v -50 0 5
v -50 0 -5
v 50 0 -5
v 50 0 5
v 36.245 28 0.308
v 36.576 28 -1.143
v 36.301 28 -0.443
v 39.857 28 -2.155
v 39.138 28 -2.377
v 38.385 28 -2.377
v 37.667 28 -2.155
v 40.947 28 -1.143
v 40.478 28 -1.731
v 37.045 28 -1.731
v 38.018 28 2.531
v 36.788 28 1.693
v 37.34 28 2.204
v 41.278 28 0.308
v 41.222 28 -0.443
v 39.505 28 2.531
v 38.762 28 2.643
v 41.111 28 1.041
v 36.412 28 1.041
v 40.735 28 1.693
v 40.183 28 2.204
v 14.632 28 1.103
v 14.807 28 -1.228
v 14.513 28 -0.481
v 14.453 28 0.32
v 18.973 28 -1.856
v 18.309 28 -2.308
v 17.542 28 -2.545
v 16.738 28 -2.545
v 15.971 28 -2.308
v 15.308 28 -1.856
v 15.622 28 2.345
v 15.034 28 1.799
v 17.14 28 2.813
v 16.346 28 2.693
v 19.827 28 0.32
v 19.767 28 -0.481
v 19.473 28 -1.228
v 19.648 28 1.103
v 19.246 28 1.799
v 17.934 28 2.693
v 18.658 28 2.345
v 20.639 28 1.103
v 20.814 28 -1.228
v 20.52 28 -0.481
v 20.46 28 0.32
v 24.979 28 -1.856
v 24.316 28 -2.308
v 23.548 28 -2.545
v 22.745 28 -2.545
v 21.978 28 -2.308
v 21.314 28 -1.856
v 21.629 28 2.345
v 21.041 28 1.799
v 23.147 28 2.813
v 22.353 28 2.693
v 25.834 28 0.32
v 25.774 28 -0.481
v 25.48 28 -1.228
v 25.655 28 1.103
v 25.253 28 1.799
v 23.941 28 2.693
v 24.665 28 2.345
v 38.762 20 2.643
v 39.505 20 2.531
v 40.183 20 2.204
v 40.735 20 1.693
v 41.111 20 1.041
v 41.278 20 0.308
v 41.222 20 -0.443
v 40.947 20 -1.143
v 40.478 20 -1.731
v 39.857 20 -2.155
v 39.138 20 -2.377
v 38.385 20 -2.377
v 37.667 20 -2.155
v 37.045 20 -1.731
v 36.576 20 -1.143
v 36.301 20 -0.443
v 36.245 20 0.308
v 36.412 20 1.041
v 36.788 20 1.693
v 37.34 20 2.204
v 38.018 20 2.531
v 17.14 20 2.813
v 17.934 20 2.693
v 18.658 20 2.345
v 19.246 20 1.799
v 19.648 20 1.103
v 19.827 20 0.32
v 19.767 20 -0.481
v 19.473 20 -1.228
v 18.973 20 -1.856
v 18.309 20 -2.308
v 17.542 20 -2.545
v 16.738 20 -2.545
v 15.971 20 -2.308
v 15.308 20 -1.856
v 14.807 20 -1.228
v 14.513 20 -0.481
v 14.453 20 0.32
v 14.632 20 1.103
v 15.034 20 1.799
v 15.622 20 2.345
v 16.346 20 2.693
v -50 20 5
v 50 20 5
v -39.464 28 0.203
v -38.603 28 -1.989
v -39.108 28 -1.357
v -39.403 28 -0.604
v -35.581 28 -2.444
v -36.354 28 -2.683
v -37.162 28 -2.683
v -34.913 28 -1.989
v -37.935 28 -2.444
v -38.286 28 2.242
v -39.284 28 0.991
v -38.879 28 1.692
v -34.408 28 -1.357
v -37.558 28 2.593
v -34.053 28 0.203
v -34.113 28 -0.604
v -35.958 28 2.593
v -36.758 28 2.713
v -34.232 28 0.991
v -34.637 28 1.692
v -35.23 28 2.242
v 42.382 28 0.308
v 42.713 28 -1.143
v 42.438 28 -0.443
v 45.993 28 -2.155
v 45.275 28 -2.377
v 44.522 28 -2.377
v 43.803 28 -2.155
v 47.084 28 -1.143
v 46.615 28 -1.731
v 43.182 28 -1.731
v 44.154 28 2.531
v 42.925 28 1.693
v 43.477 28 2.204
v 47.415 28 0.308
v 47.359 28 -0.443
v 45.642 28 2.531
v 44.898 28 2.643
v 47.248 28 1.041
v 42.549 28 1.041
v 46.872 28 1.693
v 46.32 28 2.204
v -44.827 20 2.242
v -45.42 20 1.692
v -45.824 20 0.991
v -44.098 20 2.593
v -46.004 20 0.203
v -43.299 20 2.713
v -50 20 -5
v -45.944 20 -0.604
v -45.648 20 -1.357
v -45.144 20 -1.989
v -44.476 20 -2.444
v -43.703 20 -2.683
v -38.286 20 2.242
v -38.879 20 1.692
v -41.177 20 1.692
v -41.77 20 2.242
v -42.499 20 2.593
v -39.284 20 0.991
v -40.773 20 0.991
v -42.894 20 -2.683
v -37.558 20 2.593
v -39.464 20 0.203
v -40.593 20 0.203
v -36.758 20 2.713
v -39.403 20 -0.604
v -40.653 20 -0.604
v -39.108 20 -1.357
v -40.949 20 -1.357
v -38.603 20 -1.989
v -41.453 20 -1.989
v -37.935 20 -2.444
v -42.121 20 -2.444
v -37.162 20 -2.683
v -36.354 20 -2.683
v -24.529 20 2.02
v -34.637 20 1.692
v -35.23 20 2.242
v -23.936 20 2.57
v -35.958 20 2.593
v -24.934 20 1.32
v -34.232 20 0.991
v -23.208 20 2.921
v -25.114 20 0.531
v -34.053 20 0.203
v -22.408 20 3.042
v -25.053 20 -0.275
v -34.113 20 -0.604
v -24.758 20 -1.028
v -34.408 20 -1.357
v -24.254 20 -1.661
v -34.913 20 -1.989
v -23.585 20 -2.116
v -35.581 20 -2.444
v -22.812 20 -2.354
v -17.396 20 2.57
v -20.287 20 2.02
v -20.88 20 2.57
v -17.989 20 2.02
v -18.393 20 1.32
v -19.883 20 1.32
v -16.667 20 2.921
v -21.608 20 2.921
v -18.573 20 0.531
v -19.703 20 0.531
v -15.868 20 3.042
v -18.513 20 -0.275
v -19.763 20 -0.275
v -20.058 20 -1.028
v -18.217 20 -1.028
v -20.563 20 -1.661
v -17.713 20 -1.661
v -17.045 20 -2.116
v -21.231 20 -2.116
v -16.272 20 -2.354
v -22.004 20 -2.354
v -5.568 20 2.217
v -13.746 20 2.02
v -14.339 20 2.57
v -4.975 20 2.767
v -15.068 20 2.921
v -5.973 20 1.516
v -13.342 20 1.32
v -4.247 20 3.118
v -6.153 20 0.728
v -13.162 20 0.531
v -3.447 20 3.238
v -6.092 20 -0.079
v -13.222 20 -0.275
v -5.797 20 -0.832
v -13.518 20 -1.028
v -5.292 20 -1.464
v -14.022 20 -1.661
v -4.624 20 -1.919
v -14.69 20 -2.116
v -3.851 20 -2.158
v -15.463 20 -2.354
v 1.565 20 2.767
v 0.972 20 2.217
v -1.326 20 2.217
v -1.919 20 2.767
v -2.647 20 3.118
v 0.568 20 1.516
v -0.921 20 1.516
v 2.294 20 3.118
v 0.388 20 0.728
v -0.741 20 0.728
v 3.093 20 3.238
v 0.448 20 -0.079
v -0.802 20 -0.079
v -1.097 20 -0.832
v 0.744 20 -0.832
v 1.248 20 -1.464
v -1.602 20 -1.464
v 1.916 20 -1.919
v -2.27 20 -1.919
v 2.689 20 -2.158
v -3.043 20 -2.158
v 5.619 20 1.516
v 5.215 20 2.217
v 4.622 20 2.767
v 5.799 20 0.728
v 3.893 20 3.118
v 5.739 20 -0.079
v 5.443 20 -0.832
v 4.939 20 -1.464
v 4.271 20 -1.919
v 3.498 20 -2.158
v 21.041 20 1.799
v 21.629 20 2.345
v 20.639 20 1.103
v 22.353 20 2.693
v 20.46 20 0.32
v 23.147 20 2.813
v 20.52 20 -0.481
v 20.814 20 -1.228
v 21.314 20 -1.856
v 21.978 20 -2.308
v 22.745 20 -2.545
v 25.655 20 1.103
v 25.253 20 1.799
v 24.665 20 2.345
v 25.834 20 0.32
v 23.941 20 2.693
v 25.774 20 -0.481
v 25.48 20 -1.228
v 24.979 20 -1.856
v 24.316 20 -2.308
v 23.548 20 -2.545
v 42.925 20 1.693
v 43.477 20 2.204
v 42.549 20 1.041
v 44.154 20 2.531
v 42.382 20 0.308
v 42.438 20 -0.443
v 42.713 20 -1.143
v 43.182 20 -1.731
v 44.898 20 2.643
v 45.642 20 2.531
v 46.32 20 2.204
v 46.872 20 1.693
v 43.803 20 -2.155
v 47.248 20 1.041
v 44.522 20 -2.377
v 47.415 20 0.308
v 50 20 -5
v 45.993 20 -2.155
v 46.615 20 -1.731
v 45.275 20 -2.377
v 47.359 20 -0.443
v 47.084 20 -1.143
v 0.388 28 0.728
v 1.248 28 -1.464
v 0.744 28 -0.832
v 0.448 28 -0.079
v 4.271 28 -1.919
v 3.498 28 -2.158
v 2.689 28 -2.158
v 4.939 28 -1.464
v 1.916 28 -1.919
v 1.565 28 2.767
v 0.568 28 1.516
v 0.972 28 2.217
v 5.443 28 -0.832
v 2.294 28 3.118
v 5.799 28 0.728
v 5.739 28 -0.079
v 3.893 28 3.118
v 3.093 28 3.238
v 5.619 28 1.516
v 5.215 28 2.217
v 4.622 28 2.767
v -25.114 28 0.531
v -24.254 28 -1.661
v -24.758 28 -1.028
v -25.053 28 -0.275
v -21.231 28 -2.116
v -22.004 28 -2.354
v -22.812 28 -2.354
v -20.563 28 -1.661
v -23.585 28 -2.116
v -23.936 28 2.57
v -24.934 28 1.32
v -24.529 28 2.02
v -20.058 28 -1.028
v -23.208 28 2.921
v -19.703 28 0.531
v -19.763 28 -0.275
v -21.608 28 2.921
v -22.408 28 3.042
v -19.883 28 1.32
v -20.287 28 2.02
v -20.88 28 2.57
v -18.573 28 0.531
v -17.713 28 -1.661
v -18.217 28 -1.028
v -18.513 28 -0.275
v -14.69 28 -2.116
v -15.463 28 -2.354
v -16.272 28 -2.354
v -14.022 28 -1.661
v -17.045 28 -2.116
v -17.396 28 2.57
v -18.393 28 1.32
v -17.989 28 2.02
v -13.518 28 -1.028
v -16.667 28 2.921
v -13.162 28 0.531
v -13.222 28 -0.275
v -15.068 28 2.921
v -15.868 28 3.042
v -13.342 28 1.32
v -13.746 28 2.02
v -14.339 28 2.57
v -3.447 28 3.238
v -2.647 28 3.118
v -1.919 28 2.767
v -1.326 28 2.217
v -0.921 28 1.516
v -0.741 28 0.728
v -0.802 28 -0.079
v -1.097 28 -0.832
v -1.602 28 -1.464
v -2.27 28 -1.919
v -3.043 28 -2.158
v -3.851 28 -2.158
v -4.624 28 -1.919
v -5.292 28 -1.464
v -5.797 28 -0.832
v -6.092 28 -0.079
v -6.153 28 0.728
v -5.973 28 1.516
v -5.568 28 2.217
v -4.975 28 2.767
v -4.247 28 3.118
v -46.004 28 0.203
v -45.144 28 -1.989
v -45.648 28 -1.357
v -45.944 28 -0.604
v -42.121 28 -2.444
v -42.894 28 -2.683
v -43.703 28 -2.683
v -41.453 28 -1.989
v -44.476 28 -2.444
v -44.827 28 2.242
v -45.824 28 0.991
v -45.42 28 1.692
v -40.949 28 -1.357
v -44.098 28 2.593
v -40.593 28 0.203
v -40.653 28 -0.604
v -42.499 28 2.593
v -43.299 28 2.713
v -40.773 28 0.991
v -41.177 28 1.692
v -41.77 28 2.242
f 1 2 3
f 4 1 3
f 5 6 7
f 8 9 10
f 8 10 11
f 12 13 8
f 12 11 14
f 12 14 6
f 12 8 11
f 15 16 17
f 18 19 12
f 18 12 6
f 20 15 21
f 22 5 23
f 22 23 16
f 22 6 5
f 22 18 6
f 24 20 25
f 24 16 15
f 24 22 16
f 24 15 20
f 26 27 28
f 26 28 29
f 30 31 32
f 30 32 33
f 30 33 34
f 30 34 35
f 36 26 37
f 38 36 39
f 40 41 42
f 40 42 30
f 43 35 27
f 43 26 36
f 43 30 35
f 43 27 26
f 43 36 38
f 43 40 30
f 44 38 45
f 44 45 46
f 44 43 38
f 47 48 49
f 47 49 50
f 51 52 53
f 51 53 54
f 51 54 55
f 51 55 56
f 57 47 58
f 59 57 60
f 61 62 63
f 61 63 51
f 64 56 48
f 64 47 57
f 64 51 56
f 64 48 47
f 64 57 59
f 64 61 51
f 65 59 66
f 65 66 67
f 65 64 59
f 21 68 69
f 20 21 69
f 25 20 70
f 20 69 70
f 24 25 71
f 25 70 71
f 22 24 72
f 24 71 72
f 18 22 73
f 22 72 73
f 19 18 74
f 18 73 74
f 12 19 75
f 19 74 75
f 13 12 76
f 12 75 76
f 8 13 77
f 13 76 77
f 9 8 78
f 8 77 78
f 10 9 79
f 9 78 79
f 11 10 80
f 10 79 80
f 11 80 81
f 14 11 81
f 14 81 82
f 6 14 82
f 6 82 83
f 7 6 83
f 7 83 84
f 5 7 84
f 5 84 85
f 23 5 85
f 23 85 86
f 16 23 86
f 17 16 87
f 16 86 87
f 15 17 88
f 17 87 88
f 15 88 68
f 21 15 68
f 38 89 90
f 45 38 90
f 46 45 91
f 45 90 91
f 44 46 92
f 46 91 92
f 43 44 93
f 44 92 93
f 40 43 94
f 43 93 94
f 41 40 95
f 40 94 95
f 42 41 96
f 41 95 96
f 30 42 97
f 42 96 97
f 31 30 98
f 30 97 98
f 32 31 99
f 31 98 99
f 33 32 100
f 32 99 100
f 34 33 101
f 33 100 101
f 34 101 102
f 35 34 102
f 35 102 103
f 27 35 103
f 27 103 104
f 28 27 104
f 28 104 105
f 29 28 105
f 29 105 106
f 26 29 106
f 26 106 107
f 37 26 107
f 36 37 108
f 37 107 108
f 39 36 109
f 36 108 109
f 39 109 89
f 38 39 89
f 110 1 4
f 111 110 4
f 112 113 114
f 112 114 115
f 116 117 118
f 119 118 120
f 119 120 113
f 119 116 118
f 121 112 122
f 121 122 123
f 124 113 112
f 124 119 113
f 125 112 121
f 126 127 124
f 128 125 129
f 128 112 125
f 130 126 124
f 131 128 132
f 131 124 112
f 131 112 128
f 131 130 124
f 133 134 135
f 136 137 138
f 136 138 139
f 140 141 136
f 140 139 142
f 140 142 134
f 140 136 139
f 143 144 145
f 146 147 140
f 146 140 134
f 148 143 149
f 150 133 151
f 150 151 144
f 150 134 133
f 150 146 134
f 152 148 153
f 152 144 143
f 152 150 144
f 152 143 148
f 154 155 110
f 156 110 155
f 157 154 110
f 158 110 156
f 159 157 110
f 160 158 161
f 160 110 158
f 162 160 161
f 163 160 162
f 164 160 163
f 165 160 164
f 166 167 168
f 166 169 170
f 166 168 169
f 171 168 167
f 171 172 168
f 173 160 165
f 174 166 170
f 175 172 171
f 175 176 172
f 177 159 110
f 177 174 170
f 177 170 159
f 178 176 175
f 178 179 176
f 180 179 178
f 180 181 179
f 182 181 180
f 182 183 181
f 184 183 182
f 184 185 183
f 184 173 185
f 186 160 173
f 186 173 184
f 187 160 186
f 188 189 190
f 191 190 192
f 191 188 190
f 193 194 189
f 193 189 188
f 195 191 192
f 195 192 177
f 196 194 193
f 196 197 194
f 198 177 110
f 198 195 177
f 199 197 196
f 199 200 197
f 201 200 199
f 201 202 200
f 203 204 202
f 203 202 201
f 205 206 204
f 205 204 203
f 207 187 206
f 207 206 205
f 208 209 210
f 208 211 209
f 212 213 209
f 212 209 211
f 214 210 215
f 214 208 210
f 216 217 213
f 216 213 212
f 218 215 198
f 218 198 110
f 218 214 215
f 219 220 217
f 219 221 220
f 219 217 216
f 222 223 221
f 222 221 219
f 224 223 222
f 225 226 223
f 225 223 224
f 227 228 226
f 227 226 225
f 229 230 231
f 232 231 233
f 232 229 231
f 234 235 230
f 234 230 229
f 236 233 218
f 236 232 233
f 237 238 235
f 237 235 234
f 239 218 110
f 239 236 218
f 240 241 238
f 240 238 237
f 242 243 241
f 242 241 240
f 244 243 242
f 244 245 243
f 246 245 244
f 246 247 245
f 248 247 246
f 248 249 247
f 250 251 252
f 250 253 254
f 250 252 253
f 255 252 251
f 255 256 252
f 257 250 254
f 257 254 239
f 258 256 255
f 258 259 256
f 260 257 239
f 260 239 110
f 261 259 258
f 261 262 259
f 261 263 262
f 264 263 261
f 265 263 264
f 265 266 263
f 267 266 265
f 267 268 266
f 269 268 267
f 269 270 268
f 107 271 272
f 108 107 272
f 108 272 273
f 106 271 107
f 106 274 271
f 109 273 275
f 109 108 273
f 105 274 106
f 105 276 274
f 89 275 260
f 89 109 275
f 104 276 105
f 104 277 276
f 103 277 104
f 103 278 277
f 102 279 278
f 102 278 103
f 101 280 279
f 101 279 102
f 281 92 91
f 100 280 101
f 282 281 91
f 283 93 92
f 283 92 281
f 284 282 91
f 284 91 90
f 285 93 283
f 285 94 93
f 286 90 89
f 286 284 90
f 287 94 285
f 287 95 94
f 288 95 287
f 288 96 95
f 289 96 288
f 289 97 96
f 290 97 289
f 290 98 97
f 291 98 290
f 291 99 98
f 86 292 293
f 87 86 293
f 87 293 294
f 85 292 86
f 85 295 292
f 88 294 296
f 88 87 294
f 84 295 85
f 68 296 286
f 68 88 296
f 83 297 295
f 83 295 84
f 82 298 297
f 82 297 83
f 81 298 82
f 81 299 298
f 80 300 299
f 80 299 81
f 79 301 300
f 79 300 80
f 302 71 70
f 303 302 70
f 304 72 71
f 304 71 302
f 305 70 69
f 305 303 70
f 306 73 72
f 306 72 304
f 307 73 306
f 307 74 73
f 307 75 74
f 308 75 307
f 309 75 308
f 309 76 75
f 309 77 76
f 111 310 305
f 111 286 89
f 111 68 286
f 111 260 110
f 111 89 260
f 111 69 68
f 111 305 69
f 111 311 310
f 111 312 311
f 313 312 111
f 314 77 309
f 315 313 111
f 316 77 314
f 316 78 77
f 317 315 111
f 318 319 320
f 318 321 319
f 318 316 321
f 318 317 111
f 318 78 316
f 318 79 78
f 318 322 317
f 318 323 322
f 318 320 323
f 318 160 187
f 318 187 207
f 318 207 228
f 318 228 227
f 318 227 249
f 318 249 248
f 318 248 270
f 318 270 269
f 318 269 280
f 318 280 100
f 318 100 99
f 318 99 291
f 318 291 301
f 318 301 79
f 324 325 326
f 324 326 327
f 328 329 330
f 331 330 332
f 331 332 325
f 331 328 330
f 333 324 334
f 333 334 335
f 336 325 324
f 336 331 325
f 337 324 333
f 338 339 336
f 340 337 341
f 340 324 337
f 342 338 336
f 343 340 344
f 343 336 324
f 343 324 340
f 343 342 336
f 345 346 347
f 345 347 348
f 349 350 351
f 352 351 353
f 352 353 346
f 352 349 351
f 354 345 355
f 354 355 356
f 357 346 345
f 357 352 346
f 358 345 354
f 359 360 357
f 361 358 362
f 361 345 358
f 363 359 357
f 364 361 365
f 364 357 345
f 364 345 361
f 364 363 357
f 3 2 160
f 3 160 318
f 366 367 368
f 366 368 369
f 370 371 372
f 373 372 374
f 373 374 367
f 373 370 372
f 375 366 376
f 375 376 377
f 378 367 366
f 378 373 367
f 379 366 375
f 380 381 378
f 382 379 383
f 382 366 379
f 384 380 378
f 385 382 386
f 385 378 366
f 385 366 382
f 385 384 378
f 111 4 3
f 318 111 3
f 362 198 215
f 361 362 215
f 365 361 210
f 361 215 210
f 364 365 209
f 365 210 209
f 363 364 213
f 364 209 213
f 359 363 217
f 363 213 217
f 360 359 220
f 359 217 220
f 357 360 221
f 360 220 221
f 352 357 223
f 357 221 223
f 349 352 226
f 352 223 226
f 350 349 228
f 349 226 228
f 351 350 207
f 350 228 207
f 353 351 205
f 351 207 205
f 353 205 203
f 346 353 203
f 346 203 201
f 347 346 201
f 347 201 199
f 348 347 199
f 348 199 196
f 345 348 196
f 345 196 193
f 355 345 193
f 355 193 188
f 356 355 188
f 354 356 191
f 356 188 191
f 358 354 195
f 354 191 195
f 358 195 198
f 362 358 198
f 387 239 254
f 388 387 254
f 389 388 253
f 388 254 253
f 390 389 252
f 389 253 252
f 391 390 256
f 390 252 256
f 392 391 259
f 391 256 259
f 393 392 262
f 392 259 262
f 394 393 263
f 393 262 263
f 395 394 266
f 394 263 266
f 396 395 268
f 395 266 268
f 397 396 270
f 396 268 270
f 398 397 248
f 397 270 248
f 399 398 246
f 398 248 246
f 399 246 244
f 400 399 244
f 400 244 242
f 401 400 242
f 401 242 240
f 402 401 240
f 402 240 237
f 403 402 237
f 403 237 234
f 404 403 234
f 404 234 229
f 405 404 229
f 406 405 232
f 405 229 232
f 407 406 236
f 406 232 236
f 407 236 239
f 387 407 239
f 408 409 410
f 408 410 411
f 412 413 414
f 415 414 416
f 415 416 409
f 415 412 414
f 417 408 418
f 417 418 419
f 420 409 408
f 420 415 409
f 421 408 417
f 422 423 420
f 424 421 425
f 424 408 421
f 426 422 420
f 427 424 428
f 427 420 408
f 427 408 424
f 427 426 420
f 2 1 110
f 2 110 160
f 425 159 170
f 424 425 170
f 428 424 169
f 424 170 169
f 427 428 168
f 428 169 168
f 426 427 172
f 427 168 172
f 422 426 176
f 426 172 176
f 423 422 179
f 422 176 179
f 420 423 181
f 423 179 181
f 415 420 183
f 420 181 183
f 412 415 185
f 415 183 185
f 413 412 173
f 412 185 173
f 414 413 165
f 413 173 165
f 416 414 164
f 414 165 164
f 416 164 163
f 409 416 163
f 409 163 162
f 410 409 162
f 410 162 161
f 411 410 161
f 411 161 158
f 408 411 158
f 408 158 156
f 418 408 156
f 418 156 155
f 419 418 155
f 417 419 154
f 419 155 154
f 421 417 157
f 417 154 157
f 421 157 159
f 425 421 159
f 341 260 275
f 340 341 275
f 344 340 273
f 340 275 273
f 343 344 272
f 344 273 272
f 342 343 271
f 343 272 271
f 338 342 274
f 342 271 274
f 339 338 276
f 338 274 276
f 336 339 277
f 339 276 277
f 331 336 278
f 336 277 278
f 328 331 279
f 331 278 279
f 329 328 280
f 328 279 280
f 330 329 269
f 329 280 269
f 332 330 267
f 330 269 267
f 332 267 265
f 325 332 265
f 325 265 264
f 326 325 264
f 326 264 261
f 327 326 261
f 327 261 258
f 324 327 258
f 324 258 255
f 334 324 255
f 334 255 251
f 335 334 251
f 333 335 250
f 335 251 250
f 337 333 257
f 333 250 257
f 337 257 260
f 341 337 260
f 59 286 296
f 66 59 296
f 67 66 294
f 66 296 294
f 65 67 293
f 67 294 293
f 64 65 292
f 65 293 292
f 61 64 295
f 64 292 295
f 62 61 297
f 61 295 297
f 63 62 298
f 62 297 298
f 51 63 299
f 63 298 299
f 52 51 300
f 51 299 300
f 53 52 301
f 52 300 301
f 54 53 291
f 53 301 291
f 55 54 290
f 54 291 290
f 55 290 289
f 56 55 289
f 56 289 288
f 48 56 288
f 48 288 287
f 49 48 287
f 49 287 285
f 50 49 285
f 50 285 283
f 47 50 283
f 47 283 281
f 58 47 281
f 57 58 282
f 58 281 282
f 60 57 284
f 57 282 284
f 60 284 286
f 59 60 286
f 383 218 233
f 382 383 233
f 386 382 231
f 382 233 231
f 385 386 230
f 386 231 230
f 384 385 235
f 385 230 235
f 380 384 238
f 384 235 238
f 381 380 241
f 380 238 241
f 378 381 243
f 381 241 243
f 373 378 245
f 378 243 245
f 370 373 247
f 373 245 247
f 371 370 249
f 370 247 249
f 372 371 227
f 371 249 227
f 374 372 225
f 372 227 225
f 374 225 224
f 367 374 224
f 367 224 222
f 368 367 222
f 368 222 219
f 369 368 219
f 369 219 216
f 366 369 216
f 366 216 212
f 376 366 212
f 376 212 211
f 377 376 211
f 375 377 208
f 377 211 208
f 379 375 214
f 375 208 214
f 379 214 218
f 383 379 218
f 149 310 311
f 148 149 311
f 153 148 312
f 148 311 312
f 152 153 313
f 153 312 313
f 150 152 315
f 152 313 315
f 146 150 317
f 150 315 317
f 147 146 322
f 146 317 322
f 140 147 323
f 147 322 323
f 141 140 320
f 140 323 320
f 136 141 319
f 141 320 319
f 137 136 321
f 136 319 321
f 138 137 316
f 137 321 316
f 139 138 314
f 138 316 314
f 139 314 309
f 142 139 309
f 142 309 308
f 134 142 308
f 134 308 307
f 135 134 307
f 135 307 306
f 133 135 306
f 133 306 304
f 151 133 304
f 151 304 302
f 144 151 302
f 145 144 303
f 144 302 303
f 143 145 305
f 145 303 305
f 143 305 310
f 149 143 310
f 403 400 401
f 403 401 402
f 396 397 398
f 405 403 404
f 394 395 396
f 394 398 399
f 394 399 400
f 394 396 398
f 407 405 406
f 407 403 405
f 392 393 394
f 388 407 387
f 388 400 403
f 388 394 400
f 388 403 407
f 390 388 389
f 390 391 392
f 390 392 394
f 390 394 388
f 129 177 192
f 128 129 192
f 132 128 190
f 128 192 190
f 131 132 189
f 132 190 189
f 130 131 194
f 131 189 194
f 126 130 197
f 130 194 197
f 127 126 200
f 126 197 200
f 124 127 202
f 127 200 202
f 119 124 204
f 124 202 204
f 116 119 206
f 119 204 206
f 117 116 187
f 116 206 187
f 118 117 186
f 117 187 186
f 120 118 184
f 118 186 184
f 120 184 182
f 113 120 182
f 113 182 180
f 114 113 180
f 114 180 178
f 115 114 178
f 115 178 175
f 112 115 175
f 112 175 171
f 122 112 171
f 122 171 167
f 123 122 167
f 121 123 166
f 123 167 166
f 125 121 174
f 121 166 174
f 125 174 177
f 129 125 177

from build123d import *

# Parameters (mm, degrees)
SKETCH1_W           = 100
SKETCH1_H           = 10
BOSS_EXTRUDE1_DEPTH = 20
SKETCH2_R           = 2.713153407
SKETCH2_R_2         = 2.694189889
SKETCH2_R_3         = 2.523769014
BOSS_EXTRUDE2_DEPTH = 8


with BuildPart() as part:
    # Sketch1 → Boss-Extrude1 (new body)
    with BuildSketch(Plane(origin=(0, 0, 0), x_dir=(1, 0, 0), z_dir=(0, 1, 0))):
        Rectangle(SKETCH1_W, SKETCH1_H)
    extrude(amount=BOSS_EXTRUDE1_DEPTH)

    # Sketch2 → Boss-Extrude2 (add)
    with BuildSketch(Plane(origin=(0, 20, 0), x_dir=(1, 0, 0), z_dir=(0, 1, 0))):
        with Locations(Location((-43.29861016, 0, 0), (0, 0, 270))):
            Circle(SKETCH2_R)
        with Locations(Location((-36.758074643, 0, 0), (0, 0, 270))):
            Circle(SKETCH2_R)
        with Locations(Location((-22.408108815, -0.328361024, 0), (0, 0, 270))):
            Circle(SKETCH2_R)
        with Locations(Location((-15.867573299, -0.328361024, 0), (0, 0, 270))):
            Circle(SKETCH2_R)
        with Locations(Location((17.140046294, -0.119001471, 0), (0, 0, 270))):
            Circle(SKETCH2_R_2)
        with Locations(Location((23.146948699, -0.119001471, 0), (0, 0, 270))):
            Circle(SKETCH2_R_2)
        with Locations(Location((38.761600382, -0.119001471, 0), (0, 0, 270))):
            Circle(SKETCH2_R_3)
        with Locations(Location((44.898381169, -0.119001471, 0), (0, 0, 270))):
            Circle(SKETCH2_R_3)
        with Locations(Location((-3.447043883, -0.524988506, 0), (0, 0, 270))):
            Circle(SKETCH2_R)
        with Locations(Location((3.093491634, -0.524988506, 0), (0, 0, 270))):
            Circle(SKETCH2_R)
    extrude(amount=BOSS_EXTRUDE2_DEPTH)


solid = part.part
